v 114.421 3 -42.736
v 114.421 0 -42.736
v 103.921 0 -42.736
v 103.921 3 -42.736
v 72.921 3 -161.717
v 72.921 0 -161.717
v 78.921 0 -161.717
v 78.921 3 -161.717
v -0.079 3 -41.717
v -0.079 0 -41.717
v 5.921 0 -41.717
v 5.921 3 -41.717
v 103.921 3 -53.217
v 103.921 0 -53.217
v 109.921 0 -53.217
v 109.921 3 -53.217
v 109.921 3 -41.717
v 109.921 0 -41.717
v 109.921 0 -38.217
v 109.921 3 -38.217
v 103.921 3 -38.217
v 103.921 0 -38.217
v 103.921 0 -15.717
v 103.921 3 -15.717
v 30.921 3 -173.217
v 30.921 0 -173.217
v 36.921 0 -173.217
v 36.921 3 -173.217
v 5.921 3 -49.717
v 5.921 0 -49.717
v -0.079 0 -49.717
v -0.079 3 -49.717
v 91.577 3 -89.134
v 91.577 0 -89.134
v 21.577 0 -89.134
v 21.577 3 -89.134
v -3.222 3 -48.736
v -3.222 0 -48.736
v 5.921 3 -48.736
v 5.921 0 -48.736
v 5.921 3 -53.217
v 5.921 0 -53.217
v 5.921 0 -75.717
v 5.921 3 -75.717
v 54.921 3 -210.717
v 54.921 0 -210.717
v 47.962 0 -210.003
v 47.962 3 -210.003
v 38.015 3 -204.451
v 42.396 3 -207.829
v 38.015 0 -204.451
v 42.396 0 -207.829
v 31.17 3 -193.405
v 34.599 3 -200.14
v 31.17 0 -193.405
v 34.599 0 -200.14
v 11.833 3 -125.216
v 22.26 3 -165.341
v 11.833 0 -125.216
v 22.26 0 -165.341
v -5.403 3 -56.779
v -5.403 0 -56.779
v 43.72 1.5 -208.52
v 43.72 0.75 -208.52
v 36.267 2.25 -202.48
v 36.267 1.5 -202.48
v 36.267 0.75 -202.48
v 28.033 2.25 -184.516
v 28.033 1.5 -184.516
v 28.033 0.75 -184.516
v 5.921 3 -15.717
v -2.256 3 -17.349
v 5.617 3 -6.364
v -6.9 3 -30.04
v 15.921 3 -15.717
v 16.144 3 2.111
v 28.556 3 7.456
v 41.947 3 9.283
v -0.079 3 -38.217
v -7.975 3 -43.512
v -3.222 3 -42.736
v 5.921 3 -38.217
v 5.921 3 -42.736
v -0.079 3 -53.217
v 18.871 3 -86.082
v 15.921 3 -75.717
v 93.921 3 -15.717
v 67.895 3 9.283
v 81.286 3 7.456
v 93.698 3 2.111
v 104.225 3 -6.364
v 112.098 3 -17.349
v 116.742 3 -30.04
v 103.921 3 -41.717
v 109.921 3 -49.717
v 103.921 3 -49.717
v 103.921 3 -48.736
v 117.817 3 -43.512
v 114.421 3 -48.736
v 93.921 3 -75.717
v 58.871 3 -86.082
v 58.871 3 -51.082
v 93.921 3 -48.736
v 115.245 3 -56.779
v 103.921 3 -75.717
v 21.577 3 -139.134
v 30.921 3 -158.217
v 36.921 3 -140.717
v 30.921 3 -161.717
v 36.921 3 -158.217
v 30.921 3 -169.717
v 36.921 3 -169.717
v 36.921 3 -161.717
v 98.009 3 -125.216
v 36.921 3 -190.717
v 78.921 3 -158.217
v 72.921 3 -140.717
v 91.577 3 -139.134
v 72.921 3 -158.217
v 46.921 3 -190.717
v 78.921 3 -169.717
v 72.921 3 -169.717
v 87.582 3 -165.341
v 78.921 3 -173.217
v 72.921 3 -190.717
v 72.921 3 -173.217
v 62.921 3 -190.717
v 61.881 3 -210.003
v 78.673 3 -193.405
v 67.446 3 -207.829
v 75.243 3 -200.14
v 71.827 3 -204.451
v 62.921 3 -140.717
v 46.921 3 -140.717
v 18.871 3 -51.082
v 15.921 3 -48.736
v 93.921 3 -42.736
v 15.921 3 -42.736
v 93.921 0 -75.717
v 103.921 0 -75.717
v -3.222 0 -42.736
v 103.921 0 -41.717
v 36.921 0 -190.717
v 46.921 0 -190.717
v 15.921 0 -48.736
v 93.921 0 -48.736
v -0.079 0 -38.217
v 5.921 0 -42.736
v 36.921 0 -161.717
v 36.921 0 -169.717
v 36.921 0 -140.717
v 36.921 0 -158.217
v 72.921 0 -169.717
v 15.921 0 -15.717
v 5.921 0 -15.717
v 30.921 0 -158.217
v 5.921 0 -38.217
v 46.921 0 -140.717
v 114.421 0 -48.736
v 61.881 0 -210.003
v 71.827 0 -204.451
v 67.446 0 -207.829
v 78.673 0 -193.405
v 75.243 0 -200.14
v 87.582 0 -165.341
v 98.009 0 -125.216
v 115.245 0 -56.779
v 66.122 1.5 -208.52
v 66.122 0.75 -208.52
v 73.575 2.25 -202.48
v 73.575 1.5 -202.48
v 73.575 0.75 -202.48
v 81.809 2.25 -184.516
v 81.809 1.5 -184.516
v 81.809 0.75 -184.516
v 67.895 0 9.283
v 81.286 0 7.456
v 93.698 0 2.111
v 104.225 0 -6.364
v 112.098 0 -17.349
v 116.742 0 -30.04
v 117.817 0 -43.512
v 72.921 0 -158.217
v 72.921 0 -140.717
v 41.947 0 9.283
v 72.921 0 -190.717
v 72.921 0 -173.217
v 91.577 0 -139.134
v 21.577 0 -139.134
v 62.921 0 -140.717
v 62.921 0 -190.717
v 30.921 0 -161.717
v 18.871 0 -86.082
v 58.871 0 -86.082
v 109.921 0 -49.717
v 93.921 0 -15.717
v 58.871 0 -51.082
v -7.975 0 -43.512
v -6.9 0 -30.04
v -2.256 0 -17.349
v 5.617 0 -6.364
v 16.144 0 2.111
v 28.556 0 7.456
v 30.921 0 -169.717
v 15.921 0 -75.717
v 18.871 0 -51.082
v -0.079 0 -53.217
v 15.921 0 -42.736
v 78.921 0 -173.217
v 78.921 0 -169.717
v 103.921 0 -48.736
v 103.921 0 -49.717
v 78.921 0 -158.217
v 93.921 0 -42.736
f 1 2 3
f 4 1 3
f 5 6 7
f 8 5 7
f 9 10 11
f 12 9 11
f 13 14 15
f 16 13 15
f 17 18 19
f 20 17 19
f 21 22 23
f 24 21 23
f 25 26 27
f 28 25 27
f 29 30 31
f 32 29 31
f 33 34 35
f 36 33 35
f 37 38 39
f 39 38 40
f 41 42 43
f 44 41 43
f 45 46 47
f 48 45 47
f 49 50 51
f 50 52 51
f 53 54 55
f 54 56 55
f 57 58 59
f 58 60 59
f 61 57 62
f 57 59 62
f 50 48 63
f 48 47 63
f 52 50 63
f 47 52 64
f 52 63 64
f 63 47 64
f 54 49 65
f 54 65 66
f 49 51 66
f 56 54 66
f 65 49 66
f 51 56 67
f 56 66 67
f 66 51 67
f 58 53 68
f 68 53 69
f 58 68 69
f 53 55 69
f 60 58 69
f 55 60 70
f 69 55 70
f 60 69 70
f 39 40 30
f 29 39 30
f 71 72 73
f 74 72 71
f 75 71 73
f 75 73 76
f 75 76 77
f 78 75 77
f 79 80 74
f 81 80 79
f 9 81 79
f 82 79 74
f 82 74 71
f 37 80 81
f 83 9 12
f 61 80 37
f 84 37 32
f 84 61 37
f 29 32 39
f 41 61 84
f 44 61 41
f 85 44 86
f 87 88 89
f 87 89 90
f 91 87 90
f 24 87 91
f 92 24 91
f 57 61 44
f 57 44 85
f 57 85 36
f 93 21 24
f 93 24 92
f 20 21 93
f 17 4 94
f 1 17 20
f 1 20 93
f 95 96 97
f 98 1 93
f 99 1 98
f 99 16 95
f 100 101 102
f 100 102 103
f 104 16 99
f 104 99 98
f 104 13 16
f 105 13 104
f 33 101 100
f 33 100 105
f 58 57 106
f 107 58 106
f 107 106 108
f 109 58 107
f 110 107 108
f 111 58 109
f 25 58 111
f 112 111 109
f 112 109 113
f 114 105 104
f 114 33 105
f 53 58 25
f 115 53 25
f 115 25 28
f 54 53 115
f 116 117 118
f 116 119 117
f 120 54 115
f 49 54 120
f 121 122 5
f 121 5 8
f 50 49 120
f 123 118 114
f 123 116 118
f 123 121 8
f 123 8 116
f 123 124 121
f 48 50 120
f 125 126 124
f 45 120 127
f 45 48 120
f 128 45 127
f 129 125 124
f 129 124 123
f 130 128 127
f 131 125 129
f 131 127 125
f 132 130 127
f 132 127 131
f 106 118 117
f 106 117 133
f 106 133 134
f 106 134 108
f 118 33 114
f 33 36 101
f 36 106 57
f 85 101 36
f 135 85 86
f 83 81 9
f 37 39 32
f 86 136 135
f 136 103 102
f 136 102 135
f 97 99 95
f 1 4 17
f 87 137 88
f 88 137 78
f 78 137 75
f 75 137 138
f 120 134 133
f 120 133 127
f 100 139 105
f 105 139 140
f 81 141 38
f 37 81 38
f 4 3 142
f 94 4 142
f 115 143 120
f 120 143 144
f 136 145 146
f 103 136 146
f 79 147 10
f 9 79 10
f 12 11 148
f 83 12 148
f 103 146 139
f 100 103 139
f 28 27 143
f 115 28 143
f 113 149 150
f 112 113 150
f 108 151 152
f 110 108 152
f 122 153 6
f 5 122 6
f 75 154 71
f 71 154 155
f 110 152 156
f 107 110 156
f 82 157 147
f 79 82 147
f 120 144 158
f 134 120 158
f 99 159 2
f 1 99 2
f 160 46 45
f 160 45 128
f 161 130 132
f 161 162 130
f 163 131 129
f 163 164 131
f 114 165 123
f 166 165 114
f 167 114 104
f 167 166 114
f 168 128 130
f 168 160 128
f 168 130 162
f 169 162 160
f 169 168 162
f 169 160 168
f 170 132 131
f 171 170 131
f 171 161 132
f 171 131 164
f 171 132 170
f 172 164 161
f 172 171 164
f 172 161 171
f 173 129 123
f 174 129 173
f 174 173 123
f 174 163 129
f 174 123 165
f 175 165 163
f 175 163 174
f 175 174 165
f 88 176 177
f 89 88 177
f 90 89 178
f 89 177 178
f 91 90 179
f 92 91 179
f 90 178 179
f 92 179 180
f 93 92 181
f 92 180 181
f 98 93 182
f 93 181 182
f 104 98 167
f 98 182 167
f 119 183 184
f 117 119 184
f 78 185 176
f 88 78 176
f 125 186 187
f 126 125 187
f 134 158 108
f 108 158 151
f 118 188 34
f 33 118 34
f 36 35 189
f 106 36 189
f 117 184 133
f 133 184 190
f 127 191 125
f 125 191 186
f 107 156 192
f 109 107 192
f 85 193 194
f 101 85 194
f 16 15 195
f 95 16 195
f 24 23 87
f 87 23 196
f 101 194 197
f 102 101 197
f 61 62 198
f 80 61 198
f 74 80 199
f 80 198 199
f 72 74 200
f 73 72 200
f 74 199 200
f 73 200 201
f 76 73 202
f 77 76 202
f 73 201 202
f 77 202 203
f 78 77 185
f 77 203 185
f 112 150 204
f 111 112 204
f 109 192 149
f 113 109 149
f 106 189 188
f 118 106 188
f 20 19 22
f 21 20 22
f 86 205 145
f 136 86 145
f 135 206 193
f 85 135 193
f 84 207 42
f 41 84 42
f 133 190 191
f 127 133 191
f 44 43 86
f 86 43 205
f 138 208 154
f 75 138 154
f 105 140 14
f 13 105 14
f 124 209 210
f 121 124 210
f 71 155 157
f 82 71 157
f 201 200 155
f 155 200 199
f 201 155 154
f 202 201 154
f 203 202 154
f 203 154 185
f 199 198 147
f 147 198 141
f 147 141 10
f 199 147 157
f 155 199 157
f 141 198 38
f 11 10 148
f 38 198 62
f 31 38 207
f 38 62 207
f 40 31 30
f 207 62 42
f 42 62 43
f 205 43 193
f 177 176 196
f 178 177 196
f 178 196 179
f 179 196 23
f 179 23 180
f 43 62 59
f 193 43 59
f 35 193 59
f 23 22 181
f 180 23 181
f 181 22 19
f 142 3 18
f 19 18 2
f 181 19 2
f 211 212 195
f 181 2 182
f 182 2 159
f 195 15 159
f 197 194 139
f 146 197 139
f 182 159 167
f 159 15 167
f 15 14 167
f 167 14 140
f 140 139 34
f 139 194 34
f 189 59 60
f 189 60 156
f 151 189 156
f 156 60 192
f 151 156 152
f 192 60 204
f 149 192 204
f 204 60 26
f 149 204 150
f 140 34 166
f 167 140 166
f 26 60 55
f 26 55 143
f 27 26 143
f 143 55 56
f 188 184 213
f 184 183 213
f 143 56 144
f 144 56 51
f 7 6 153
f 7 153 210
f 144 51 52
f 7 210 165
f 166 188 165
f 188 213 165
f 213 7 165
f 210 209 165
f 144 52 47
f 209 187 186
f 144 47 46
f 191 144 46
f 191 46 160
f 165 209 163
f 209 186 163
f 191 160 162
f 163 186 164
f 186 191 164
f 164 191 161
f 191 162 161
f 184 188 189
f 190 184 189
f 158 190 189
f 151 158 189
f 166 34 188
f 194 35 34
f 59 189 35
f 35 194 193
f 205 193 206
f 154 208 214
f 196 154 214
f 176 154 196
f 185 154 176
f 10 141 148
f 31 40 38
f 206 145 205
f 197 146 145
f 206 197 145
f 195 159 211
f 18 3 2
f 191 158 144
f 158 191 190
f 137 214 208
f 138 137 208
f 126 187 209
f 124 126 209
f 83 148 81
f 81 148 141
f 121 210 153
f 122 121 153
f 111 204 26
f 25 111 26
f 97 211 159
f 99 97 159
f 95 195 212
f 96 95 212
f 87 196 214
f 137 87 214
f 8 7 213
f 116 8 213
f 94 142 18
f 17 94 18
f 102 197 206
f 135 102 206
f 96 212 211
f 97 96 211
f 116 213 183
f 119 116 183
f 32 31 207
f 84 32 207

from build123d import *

# Parameters (mm, degrees)
BOSS_EXTRUDE1_DEPTH = 3


with BuildPart() as part:
    # Sketch1 → Boss-Extrude1 (new body)
    # profile 1 of 2: a face of its own
    with BuildSketch(Plane(origin=(0, 0, 0), x_dir=(1, 0, 0), z_dir=(0, 1, 0))):
        with BuildLine():
            add(Edge.make_bspline(
                [(54.921096163, 210.717166197), (55.81137082, 210.717166197), (73.117417783, 210.307734869), (83.16859041, 181.782071598), (97.327576281, 130.307148929), (107.260265849, 85.588568729), (115.245027355, 56.779327706)],
                knots=[0, 0, 0, 0, 0.011068306, 0.221366129, 0.459883163, 1, 1, 1, 1], degree=3))
            Line((54.921096163, 210.717166197), (54.921096163, 139.134229743))
            Line((54.921096163, 139.134229743), (91.576602309, 139.134229743))
            Line((91.576602309, 139.134229743), (91.576602309, 89.134229743))
            Line((91.576602309, 89.134229743), (54.921096163, 89.134229743))
            Line((54.921096163, 89.134229743), (54.921096163, 86.082402682))
            Line((54.921096163, 86.082402682), (58.870747079, 86.082402682))
            Line((58.870747079, 86.082402682), (58.870747079, 51.082402682))
            Line((58.870747079, 51.082402682), (54.921096163, 51.082402682))
            Line((54.921096163, 51.082402682), (54.921096163, 48.736405384))
            Line((54.921096163, 48.736405384), (93.921096163, 48.736405384))
            Line((93.921096163, 48.736405384), (93.921096163, 75.717166197))
            Line((93.921096163, 75.717166197), (103.921096163, 75.717166197))
            Line((103.921096163, 75.717166197), (103.921096163, 53.217166197))
            Line((103.921096163, 53.217166197), (109.921096163, 53.217166197))
            Line((109.921096163, 53.217166197), (109.921096163, 49.717166197))
            Line((109.921096163, 49.717166197), (103.921096163, 49.717166197))
            Line((103.921096163, 49.717166197), (103.921096163, 48.736405384))
            Line((103.921096163, 48.736405384), (114.420720505, 48.736405384))
            Line((114.420720505, 48.736405384), (114.420720505, 42.736405384))
            Line((114.420720505, 42.736405384), (103.921096163, 42.736405384))
            Line((103.921096163, 42.736405384), (103.921096163, 41.717166197))
            Line((103.921096163, 41.717166197), (109.921096163, 41.717166197))
            Line((109.921096163, 41.717166197), (109.921096163, 38.217166197))
            Line((109.921096163, 38.217166197), (103.921096163, 38.217166197))
            Line((103.921096163, 38.217166197), (103.921096163, 15.717166197))
            Line((103.921096163, 15.717166197), (93.921096163, 15.717166197))
            Line((93.921096163, 15.717166197), (93.921096163, 42.736405384))
            Line((93.921096163, 42.736405384), (54.921096163, 42.736405384))
            Line((54.921096163, 42.736405384), (54.921096163, -9.282833803))
            Line((54.921096163, -9.282833803), (64.921096163, -9.282833803))
            Line((64.921096163, -9.282833803), (67.895191372, -9.282833803))
            ThreePointArc((67.895191372, -9.282833803), (108.534507775, 11.589070443), (115.245027355, 56.779327706))
        make_face()
        Polygon((72.921096163, 161.717166197), (78.921096163, 161.717166197), (78.921096163, 158.217166197), (72.921096163, 158.217166197), (72.921096163, 140.717166197), (62.921096163, 140.717166197), (62.921096163, 190.717166197), (72.921096163, 190.717166197), (72.921096163, 173.217166197), (78.921096163, 173.217166197), (78.921096163, 169.717166197), (72.921096163, 169.717166197), align=None, mode=Mode.SUBTRACT)
    # profile 2 of 2: a face of its own
    with BuildSketch(Plane(origin=(0, 0, 0), x_dir=(1, 0, 0), z_dir=(0, 1, 0))):
        with BuildLine():
            Line((54.921096163, 139.134229743), (54.921096163, 210.717166197))
            add(Edge.make_bspline(
                [(54.921096163, 210.717166197), (54.030821506, 210.717166197), (36.724774544, 210.307734869), (26.673601916, 181.782071598), (12.514616045, 130.307148929), (2.581926477, 85.588568729), (-5.402835029, 56.779327706)],
                knots=[0, 0, 0, 0, 0.011068306, 0.221366129, 0.459883163, 1, 1, 1, 1], degree=3))
            ThreePointArc((-5.402835029, 56.779327706), (1.307684551, 11.589070443), (41.947000955, -9.282833803))
            Line((41.947000955, -9.282833803), (44.921096163, -9.282833803))
            Line((44.921096163, -9.282833803), (54.921096163, -9.282833803))
            Line((54.921096163, -9.282833803), (54.921096163, 42.736405384))
            Line((54.921096163, 42.736405384), (15.921096163, 42.736405384))
            Line((15.921096163, 42.736405384), (15.921096163, 15.717166197))
            Line((15.921096163, 15.717166197), (5.921096163, 15.717166197))
            Line((5.921096163, 15.717166197), (5.921096163, 38.217166197))
            Line((5.921096163, 38.217166197), (-0.078903837, 38.217166197))
            Line((-0.078903837, 38.217166197), (-0.078903837, 41.717166197))
            Line((-0.078903837, 41.717166197), (5.921096163, 41.717166197))
            Line((5.921096163, 41.717166197), (5.921096163, 42.736405384))
            Line((5.921096163, 42.736405384), (-3.221531429, 42.736405384))
            Line((-3.221531429, 42.736405384), (-3.221531429, 48.736405384))
            Line((-3.221531429, 48.736405384), (5.921096163, 48.736405384))
            Line((5.921096163, 48.736405384), (5.921096163, 49.717166197))
            Line((5.921096163, 49.717166197), (-0.078903837, 49.717166197))
            Line((-0.078903837, 49.717166197), (-0.078903837, 53.217166197))
            Line((-0.078903837, 53.217166197), (5.921096163, 53.217166197))
            Line((5.921096163, 53.217166197), (5.921096163, 75.717166197))
            Line((5.921096163, 75.717166197), (15.921096163, 75.717166197))
            Line((15.921096163, 75.717166197), (15.921096163, 48.736405384))
            Line((15.921096163, 48.736405384), (54.921096163, 48.736405384))
            Line((54.921096163, 48.736405384), (54.921096163, 51.082402682))
            Line((54.921096163, 51.082402682), (18.870747079, 51.082402682))
            Line((18.870747079, 51.082402682), (18.870747079, 86.082402682))
            Line((18.870747079, 86.082402682), (54.921096163, 86.082402682))
            Line((54.921096163, 86.082402682), (54.921096163, 89.134229743))
            Line((54.921096163, 89.134229743), (21.576602309, 89.134229743))
            Line((21.576602309, 89.134229743), (21.576602309, 139.134229743))
            Line((21.576602309, 139.134229743), (54.921096163, 139.134229743))
        make_face()
        Polygon((30.921096163, 169.717166197), (30.921096163, 173.217166197), (36.921096163, 173.217166197), (36.921096163, 190.717166197), (46.921096163, 190.717166197), (46.921096163, 140.717166197), (36.921096163, 140.717166197), (36.921096163, 158.217166197), (30.921096163, 158.217166197), (30.921096163, 161.717166197), (36.921096163, 161.717166197), (36.921096163, 169.717166197), align=None, mode=Mode.SUBTRACT)
    extrude(amount=BOSS_EXTRUDE1_DEPTH)


solid = part.part
